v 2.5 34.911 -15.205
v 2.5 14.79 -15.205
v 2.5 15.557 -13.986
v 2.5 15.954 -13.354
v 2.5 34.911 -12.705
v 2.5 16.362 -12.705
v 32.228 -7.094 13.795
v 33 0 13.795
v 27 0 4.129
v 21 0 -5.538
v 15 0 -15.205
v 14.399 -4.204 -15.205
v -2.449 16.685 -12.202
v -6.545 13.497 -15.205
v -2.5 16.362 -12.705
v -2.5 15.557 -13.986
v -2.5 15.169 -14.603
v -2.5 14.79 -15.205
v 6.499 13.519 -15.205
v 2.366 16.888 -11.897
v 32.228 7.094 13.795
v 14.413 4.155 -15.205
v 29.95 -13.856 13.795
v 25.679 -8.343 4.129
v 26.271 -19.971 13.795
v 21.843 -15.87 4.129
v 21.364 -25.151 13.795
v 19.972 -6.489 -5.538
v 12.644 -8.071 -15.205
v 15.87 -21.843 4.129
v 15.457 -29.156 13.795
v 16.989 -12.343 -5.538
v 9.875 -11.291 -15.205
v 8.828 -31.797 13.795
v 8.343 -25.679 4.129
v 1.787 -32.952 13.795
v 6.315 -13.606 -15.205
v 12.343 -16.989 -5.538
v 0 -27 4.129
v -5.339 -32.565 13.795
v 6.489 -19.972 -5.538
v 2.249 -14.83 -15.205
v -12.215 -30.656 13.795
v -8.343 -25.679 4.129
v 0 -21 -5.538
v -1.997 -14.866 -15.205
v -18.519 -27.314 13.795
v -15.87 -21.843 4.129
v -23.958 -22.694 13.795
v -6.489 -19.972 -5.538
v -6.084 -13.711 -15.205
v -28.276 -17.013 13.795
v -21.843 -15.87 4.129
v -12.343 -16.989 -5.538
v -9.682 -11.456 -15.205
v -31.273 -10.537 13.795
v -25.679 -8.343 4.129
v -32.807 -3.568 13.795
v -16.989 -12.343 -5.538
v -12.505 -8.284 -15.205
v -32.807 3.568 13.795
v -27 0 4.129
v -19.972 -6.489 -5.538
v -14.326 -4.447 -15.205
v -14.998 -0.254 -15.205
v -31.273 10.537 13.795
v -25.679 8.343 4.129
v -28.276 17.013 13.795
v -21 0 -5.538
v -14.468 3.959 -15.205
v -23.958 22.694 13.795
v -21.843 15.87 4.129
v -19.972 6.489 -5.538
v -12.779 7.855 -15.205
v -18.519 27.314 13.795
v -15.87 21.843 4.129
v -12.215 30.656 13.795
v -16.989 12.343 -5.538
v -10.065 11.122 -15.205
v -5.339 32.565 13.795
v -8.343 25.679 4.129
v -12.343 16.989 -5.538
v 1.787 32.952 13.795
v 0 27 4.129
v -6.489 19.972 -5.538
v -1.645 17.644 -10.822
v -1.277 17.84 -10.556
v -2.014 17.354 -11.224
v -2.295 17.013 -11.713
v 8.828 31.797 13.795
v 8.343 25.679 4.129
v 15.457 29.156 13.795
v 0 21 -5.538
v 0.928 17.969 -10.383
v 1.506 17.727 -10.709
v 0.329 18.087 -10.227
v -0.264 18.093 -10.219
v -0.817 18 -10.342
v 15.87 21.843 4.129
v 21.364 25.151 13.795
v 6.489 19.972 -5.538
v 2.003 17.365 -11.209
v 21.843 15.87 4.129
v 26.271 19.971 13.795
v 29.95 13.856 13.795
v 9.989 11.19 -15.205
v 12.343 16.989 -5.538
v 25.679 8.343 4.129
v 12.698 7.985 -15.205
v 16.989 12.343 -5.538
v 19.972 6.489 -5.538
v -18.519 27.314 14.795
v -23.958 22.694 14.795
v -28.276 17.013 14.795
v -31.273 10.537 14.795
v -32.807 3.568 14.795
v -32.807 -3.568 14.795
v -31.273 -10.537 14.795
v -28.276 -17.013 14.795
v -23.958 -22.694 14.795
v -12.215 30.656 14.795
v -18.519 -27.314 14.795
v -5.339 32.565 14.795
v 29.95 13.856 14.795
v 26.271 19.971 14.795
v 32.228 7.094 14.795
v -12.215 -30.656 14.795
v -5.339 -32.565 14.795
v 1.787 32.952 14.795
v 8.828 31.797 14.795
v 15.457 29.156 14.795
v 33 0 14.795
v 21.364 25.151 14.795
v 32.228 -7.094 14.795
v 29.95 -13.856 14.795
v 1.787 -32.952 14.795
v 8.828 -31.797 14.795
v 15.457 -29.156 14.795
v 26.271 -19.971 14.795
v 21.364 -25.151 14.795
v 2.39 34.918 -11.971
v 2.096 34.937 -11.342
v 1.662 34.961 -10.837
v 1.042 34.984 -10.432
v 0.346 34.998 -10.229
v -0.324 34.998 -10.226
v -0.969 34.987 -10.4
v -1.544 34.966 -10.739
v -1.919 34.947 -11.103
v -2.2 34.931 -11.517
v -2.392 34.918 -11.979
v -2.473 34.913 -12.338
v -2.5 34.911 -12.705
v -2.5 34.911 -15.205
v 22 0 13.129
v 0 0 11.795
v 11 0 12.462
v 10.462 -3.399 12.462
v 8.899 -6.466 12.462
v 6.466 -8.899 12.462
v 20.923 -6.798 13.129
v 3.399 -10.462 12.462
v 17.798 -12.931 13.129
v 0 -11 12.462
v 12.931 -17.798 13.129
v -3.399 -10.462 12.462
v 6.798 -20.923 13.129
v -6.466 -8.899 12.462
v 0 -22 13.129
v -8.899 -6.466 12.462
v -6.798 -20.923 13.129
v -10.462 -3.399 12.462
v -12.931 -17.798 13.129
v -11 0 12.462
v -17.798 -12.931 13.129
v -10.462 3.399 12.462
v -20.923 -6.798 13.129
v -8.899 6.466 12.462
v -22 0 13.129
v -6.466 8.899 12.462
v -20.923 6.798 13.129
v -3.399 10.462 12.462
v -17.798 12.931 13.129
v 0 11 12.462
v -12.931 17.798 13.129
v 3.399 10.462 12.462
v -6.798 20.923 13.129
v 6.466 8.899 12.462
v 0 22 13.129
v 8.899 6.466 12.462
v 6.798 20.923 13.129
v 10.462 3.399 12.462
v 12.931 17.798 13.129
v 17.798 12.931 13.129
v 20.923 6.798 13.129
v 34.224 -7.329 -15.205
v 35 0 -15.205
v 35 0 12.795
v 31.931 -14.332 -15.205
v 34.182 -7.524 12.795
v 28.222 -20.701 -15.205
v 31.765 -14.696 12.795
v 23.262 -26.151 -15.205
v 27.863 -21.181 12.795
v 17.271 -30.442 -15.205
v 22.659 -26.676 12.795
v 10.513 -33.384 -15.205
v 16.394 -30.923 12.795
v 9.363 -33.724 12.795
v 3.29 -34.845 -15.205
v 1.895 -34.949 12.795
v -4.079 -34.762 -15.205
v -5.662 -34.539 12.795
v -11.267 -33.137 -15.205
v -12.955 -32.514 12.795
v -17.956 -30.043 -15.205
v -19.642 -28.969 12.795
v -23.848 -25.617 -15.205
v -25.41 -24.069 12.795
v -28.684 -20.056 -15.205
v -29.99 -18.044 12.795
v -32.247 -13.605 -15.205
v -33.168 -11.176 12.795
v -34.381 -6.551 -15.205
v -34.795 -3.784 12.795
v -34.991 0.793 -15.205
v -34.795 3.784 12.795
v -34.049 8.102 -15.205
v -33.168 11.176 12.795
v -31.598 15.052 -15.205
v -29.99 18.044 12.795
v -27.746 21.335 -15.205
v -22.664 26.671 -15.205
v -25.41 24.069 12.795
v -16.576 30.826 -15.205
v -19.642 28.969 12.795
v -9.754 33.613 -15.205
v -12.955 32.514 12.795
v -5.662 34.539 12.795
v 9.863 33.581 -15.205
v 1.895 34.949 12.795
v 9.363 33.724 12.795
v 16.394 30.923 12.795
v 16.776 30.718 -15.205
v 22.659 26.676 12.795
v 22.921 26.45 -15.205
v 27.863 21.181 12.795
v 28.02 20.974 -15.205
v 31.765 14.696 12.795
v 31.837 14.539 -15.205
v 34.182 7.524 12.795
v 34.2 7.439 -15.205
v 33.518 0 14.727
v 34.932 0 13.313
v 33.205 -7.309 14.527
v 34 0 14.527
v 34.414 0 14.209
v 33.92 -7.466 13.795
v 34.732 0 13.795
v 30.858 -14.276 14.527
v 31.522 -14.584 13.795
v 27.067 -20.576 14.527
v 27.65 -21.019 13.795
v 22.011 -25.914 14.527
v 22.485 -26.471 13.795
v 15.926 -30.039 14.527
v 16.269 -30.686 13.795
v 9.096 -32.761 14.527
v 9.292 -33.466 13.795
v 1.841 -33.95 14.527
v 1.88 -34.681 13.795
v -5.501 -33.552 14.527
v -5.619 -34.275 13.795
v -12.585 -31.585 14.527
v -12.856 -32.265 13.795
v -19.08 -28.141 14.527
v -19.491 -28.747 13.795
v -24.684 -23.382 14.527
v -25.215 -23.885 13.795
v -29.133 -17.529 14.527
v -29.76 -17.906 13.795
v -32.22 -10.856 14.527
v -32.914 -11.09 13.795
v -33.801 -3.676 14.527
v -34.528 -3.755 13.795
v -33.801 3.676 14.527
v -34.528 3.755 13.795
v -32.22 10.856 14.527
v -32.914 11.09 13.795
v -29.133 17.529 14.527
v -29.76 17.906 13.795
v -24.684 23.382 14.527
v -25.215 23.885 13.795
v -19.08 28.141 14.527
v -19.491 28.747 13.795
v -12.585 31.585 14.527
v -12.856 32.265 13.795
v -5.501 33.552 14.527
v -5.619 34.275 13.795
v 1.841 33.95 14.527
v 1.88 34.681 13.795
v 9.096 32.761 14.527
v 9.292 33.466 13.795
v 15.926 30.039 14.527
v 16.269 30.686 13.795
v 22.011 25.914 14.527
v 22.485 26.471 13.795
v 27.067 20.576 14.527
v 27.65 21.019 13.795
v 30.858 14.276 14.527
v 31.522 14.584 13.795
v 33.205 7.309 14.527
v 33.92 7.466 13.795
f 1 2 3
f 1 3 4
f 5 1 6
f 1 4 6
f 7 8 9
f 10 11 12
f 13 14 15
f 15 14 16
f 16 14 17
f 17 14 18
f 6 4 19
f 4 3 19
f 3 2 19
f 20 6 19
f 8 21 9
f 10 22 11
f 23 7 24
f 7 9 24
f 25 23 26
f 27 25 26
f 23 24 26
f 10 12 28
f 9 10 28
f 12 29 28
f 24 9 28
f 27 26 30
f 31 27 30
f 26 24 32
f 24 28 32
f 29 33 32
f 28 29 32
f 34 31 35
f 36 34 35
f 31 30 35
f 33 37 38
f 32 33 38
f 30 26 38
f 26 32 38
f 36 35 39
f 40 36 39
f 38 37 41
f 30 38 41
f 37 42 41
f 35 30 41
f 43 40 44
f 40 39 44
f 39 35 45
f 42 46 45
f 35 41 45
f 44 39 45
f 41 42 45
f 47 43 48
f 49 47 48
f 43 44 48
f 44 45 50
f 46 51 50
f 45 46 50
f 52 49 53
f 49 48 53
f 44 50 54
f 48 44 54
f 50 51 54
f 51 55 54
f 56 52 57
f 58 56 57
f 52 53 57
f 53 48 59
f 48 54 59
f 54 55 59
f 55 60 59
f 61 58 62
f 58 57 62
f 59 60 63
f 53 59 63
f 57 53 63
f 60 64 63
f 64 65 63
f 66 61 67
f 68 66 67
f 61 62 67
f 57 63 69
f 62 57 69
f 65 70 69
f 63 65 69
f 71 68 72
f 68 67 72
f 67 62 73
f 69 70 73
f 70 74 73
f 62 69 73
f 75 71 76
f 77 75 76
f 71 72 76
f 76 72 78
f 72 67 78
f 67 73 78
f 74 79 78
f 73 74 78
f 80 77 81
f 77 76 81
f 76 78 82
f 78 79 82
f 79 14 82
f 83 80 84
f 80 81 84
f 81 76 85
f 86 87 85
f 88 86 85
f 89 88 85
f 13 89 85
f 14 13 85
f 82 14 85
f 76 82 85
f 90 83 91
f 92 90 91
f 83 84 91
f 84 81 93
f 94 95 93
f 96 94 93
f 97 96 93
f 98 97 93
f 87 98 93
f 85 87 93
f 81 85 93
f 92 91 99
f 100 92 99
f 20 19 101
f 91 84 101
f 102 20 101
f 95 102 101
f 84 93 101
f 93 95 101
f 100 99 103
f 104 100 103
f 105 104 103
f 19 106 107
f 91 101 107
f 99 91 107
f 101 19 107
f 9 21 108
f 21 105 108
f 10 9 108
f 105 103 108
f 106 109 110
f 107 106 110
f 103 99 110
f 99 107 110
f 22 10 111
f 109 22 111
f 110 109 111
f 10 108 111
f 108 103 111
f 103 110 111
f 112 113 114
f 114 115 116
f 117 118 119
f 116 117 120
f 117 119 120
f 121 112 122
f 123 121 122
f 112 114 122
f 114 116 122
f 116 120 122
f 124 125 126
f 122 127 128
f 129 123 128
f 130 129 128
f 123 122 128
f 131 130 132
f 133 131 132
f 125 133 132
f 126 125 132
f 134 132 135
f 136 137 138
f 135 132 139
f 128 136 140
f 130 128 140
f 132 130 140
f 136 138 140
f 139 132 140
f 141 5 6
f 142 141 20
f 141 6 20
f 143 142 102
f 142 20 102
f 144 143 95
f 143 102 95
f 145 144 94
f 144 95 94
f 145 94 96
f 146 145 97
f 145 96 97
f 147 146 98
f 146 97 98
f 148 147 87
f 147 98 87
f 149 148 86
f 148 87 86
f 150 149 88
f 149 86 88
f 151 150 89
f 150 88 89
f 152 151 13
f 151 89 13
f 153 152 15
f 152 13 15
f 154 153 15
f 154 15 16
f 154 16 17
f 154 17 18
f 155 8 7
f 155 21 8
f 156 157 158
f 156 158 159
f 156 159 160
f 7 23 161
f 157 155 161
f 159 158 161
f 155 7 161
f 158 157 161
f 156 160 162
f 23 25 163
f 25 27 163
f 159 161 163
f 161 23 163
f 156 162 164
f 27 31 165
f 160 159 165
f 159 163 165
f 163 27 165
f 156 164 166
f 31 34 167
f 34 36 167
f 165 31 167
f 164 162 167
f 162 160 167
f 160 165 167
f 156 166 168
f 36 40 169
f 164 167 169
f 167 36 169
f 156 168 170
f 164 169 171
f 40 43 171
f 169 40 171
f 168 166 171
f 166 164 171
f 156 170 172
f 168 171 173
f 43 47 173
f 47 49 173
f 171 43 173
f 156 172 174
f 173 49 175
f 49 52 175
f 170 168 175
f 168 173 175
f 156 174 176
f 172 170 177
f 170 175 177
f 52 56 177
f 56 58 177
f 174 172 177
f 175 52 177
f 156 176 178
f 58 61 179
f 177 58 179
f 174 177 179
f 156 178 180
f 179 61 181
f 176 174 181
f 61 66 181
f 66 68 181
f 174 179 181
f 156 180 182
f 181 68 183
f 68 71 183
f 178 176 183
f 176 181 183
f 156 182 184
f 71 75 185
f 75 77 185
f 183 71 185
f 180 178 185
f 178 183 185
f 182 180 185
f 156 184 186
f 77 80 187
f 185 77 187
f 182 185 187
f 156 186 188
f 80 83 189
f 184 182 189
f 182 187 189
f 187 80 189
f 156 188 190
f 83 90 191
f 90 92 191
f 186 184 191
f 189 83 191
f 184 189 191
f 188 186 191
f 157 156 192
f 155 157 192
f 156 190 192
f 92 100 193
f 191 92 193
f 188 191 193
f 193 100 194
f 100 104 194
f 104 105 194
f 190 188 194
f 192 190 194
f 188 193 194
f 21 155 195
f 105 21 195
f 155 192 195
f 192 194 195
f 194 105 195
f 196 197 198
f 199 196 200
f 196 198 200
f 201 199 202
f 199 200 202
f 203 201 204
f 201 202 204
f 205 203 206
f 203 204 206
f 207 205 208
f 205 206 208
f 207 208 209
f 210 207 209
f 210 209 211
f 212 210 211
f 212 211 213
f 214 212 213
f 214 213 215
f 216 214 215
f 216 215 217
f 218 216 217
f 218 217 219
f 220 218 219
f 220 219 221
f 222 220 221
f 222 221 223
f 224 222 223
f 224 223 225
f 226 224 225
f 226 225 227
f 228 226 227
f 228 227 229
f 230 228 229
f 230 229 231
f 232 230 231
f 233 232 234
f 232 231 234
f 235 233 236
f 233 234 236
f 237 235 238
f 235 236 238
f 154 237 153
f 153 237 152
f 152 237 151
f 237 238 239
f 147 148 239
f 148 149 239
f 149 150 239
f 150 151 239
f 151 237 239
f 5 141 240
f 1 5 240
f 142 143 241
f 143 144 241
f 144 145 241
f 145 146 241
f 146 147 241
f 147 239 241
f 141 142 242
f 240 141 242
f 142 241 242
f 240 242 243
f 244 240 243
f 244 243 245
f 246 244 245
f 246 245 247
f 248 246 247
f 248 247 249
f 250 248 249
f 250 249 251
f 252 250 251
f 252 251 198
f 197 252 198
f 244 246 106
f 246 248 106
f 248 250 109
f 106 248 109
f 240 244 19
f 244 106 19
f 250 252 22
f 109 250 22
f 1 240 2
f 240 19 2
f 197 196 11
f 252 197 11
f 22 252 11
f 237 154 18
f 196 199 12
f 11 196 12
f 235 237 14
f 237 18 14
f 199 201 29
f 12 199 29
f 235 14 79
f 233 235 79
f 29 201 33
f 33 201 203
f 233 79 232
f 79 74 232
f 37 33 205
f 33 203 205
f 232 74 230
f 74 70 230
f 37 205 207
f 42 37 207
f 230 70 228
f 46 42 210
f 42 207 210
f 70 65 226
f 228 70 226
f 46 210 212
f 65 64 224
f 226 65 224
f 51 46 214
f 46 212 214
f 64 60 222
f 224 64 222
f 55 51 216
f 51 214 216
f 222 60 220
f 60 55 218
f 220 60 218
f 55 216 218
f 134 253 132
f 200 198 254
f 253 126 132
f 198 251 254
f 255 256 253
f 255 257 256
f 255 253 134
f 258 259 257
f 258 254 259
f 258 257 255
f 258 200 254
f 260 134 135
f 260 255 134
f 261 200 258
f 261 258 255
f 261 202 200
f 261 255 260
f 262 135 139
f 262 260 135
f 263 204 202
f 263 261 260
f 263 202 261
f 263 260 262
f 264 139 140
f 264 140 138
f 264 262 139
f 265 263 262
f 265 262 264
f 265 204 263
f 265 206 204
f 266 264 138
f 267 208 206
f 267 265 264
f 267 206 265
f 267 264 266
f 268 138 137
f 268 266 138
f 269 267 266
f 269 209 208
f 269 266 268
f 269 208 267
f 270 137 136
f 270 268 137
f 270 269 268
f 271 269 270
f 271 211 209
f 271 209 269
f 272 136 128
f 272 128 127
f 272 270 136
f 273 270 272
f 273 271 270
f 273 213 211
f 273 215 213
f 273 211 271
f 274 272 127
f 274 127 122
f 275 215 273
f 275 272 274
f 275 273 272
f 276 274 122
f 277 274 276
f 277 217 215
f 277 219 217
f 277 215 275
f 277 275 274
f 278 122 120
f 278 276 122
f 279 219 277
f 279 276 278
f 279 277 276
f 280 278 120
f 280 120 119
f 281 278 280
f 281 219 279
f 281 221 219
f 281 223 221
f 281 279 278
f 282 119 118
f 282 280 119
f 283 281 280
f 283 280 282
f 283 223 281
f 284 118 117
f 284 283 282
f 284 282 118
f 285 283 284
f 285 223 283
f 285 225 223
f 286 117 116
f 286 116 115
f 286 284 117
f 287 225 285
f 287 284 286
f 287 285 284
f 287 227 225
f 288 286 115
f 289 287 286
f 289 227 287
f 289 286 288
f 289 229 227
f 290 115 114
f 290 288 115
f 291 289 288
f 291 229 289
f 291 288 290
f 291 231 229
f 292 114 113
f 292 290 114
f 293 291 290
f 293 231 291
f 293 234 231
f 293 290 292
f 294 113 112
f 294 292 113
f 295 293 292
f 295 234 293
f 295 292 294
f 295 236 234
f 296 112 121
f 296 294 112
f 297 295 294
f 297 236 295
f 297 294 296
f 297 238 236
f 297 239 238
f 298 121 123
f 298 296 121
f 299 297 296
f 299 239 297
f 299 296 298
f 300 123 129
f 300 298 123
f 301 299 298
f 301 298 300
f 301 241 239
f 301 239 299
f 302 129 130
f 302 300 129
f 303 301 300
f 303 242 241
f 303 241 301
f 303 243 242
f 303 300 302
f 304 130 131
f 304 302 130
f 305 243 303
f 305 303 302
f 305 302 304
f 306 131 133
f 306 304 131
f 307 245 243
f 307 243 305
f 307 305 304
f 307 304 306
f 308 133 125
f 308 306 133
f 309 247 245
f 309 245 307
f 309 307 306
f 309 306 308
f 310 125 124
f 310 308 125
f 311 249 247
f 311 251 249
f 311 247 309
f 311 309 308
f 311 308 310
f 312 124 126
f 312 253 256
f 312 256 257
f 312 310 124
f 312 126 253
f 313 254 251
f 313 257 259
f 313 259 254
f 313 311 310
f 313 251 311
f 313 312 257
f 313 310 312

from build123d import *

# Parameters (mm, degrees)
F2_R     = 2
F4_DEPTH = 50


with BuildPart() as f1:
    # F0 (on Front) → F1 (revolve)
    with BuildSketch(Plane.XZ):
        Polygon((35, 14.7952197132), (0, 14.7952197132), (0, 11.7952197132), (33, 13.7952197132), (15, -15.2047802868), (35, -15.2047802868), align=None)
    revolve(axis=Axis((0, 0, 13.2952197132), (0, 0, -1)))

    # F2
    f2_edges = [f1.edges().sort_by_distance(p)[0] for p in [
        (-35, 0, 14.79522),
    ]]
    fillet(f2_edges, radius=F2_R)

    # F3 (on Front) → F4 (cut)
    with BuildSketch(Plane.XZ):
        with BuildLine():
            Line((-2.5, -12.7047802868), (2.5, -12.7047802868))
            ThreePointArc((2.5, -12.7047802868), (0, -10.2047802868), (-2.5, -12.7047802868))
        make_face()
        with BuildLine():
            Line((2.5, -17.7047802868), (2.5, -12.7047802868))
            ThreePointArc((2.5, -12.7047802868), (0, -15.2047802868), (-2.5, -12.7047802868))
            Line((-2.5, -12.7047802868), (-2.5, -17.7047802868))
            Line((-2.5, -17.7047802868), (2.5, -17.7047802868))
        make_face()
        with BuildLine():
            ThreePointArc((-2.5, -12.7047802868), (0, -15.2047802868), (2.5, -12.7047802868))
            Line((2.5, -12.7047802868), (-2.5, -12.7047802868))
        make_face()
    extrude(amount=-F4_DEPTH, mode=Mode.SUBTRACT)


solid = f1.part
